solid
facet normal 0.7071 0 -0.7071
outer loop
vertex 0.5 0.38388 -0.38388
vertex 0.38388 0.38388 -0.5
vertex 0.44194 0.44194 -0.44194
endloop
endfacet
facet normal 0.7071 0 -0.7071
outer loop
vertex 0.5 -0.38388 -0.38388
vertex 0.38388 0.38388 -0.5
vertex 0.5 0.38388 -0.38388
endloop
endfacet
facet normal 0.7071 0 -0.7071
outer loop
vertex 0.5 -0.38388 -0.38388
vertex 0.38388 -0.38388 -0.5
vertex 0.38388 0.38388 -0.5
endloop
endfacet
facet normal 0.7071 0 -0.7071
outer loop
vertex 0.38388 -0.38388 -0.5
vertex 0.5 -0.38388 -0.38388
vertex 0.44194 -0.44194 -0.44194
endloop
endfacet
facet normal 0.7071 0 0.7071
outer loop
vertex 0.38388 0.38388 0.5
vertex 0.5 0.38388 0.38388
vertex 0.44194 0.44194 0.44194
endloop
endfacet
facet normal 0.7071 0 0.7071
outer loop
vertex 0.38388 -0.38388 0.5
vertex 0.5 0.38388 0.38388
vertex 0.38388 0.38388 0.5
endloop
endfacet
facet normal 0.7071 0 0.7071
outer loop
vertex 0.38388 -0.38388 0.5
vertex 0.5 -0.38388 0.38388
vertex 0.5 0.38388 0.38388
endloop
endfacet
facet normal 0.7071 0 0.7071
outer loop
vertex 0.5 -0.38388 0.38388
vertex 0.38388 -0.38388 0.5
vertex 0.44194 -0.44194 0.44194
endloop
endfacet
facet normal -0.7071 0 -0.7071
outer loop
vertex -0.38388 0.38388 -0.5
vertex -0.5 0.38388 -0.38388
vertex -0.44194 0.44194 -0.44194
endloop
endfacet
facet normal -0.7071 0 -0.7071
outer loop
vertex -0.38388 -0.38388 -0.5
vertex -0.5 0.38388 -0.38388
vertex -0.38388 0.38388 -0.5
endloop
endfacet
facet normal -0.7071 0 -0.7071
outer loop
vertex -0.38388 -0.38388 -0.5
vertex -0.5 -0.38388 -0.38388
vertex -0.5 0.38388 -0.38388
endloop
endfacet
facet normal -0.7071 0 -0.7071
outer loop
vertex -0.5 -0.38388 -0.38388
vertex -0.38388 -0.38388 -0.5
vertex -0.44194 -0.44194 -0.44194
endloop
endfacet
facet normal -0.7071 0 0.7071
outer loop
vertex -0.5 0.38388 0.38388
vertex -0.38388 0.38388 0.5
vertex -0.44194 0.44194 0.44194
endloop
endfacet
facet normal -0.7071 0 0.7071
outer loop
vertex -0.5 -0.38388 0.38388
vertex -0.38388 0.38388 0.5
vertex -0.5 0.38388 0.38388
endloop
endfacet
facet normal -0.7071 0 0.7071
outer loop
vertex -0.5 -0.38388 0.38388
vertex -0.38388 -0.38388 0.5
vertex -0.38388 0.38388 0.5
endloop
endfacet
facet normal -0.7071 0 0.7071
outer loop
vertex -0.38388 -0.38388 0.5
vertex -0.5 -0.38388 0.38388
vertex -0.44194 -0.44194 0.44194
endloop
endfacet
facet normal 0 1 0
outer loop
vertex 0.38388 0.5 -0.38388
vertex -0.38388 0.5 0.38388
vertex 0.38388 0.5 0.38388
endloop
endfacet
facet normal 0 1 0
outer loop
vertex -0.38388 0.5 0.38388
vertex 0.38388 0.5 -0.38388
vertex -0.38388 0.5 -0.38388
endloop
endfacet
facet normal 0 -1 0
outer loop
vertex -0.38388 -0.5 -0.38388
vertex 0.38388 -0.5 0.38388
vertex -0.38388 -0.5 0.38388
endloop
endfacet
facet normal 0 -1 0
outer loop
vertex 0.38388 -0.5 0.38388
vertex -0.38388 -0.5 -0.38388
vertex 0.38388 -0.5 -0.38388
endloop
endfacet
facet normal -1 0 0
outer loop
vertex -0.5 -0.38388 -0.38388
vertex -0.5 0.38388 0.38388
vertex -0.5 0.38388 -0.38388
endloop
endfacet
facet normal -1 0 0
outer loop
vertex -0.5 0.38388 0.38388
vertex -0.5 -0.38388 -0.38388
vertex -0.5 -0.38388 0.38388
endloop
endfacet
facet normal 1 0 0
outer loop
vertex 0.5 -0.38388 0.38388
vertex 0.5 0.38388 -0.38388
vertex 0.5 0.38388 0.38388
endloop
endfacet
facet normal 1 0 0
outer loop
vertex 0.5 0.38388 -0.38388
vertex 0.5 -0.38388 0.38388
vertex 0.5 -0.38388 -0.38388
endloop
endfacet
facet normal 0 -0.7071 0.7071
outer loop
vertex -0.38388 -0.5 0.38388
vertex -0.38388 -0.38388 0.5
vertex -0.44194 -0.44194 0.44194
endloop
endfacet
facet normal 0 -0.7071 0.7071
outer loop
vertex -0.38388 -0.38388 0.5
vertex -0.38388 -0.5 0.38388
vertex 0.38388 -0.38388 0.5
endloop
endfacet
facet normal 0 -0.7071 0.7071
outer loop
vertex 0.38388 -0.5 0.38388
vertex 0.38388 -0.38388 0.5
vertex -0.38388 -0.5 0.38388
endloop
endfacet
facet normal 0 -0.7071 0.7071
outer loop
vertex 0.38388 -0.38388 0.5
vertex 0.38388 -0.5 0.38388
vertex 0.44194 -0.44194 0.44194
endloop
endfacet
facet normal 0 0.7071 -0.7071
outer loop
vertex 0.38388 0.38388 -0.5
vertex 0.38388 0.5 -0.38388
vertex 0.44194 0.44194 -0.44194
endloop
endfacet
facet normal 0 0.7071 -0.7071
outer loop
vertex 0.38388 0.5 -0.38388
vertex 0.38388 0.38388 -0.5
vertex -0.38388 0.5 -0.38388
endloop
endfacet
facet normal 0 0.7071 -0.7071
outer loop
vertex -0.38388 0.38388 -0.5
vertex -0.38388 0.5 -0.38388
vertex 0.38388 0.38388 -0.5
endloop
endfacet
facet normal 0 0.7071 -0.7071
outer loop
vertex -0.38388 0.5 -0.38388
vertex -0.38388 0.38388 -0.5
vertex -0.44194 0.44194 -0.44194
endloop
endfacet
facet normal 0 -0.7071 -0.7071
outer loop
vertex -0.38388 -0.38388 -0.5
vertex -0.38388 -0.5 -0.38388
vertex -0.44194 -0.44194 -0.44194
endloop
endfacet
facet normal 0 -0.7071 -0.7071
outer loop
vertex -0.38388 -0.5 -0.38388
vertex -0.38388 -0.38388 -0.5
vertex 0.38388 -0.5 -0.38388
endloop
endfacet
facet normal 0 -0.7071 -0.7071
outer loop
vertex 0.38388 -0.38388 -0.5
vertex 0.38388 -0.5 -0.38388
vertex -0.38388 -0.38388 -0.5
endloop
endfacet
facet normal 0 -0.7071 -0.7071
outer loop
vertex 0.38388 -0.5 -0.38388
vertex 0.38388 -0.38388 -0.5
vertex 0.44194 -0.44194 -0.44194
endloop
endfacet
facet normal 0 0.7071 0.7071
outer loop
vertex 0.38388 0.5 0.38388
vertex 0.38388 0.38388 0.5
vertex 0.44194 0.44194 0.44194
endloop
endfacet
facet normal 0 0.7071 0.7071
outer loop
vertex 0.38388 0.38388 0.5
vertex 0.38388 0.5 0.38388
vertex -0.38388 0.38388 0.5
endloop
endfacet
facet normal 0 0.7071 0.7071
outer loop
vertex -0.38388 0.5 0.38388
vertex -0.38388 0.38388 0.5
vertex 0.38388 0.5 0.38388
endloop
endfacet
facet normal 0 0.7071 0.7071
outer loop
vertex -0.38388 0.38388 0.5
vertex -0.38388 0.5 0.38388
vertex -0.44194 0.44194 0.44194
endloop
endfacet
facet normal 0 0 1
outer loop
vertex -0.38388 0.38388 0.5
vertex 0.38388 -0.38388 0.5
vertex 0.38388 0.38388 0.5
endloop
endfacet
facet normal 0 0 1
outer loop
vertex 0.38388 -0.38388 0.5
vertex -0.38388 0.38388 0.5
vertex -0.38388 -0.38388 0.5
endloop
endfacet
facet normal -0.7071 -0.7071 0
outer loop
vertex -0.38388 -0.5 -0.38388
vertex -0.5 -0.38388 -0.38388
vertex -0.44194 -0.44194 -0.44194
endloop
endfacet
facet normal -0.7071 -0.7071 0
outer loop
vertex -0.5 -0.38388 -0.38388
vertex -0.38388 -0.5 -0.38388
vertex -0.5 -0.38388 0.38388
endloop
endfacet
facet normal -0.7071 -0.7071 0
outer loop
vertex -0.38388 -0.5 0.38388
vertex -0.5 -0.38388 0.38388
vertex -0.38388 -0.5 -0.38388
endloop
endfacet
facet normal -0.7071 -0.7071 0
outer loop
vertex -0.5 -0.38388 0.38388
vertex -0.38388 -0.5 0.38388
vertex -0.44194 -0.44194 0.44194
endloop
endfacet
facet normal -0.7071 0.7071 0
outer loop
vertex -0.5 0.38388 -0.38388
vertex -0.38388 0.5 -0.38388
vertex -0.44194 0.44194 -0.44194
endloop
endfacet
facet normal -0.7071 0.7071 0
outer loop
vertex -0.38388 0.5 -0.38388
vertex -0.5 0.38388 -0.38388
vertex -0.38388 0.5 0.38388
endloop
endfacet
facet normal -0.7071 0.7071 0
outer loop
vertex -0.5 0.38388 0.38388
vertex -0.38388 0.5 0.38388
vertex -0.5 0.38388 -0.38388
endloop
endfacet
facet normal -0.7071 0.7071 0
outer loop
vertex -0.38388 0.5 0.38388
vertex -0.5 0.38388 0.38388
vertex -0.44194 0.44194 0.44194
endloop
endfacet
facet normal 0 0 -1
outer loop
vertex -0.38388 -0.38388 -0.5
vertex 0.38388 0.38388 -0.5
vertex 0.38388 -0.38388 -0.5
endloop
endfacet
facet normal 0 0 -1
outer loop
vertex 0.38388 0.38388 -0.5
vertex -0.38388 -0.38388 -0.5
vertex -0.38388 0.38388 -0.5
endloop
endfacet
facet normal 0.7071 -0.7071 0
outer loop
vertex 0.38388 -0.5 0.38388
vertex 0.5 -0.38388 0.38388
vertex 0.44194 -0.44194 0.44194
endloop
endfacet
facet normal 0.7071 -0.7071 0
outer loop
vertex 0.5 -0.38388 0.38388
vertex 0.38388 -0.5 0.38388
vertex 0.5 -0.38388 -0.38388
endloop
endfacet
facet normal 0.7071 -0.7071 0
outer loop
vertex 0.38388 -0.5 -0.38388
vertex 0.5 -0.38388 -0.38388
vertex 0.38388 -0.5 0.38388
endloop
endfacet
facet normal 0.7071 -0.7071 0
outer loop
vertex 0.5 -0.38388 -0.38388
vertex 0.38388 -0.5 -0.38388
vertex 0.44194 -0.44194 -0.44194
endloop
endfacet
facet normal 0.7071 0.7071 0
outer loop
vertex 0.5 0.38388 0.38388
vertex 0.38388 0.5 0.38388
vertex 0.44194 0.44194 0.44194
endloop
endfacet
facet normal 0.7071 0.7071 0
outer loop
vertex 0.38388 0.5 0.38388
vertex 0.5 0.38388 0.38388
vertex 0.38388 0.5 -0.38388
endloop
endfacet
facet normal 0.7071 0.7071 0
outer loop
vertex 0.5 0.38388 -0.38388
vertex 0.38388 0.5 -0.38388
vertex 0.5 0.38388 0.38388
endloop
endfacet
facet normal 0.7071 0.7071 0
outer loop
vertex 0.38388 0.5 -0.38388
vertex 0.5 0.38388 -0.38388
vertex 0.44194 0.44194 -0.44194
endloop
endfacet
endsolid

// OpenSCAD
s = 1;
intersection() {
    x = s+0.25;
    rotate([0,45,0])
    cube([x,s,x], center=true);
    rotate([45,0,0])
    cube([s,x,x], center=true);
    rotate([0,0,45])
    cube([x,x,s], center=true);
}
